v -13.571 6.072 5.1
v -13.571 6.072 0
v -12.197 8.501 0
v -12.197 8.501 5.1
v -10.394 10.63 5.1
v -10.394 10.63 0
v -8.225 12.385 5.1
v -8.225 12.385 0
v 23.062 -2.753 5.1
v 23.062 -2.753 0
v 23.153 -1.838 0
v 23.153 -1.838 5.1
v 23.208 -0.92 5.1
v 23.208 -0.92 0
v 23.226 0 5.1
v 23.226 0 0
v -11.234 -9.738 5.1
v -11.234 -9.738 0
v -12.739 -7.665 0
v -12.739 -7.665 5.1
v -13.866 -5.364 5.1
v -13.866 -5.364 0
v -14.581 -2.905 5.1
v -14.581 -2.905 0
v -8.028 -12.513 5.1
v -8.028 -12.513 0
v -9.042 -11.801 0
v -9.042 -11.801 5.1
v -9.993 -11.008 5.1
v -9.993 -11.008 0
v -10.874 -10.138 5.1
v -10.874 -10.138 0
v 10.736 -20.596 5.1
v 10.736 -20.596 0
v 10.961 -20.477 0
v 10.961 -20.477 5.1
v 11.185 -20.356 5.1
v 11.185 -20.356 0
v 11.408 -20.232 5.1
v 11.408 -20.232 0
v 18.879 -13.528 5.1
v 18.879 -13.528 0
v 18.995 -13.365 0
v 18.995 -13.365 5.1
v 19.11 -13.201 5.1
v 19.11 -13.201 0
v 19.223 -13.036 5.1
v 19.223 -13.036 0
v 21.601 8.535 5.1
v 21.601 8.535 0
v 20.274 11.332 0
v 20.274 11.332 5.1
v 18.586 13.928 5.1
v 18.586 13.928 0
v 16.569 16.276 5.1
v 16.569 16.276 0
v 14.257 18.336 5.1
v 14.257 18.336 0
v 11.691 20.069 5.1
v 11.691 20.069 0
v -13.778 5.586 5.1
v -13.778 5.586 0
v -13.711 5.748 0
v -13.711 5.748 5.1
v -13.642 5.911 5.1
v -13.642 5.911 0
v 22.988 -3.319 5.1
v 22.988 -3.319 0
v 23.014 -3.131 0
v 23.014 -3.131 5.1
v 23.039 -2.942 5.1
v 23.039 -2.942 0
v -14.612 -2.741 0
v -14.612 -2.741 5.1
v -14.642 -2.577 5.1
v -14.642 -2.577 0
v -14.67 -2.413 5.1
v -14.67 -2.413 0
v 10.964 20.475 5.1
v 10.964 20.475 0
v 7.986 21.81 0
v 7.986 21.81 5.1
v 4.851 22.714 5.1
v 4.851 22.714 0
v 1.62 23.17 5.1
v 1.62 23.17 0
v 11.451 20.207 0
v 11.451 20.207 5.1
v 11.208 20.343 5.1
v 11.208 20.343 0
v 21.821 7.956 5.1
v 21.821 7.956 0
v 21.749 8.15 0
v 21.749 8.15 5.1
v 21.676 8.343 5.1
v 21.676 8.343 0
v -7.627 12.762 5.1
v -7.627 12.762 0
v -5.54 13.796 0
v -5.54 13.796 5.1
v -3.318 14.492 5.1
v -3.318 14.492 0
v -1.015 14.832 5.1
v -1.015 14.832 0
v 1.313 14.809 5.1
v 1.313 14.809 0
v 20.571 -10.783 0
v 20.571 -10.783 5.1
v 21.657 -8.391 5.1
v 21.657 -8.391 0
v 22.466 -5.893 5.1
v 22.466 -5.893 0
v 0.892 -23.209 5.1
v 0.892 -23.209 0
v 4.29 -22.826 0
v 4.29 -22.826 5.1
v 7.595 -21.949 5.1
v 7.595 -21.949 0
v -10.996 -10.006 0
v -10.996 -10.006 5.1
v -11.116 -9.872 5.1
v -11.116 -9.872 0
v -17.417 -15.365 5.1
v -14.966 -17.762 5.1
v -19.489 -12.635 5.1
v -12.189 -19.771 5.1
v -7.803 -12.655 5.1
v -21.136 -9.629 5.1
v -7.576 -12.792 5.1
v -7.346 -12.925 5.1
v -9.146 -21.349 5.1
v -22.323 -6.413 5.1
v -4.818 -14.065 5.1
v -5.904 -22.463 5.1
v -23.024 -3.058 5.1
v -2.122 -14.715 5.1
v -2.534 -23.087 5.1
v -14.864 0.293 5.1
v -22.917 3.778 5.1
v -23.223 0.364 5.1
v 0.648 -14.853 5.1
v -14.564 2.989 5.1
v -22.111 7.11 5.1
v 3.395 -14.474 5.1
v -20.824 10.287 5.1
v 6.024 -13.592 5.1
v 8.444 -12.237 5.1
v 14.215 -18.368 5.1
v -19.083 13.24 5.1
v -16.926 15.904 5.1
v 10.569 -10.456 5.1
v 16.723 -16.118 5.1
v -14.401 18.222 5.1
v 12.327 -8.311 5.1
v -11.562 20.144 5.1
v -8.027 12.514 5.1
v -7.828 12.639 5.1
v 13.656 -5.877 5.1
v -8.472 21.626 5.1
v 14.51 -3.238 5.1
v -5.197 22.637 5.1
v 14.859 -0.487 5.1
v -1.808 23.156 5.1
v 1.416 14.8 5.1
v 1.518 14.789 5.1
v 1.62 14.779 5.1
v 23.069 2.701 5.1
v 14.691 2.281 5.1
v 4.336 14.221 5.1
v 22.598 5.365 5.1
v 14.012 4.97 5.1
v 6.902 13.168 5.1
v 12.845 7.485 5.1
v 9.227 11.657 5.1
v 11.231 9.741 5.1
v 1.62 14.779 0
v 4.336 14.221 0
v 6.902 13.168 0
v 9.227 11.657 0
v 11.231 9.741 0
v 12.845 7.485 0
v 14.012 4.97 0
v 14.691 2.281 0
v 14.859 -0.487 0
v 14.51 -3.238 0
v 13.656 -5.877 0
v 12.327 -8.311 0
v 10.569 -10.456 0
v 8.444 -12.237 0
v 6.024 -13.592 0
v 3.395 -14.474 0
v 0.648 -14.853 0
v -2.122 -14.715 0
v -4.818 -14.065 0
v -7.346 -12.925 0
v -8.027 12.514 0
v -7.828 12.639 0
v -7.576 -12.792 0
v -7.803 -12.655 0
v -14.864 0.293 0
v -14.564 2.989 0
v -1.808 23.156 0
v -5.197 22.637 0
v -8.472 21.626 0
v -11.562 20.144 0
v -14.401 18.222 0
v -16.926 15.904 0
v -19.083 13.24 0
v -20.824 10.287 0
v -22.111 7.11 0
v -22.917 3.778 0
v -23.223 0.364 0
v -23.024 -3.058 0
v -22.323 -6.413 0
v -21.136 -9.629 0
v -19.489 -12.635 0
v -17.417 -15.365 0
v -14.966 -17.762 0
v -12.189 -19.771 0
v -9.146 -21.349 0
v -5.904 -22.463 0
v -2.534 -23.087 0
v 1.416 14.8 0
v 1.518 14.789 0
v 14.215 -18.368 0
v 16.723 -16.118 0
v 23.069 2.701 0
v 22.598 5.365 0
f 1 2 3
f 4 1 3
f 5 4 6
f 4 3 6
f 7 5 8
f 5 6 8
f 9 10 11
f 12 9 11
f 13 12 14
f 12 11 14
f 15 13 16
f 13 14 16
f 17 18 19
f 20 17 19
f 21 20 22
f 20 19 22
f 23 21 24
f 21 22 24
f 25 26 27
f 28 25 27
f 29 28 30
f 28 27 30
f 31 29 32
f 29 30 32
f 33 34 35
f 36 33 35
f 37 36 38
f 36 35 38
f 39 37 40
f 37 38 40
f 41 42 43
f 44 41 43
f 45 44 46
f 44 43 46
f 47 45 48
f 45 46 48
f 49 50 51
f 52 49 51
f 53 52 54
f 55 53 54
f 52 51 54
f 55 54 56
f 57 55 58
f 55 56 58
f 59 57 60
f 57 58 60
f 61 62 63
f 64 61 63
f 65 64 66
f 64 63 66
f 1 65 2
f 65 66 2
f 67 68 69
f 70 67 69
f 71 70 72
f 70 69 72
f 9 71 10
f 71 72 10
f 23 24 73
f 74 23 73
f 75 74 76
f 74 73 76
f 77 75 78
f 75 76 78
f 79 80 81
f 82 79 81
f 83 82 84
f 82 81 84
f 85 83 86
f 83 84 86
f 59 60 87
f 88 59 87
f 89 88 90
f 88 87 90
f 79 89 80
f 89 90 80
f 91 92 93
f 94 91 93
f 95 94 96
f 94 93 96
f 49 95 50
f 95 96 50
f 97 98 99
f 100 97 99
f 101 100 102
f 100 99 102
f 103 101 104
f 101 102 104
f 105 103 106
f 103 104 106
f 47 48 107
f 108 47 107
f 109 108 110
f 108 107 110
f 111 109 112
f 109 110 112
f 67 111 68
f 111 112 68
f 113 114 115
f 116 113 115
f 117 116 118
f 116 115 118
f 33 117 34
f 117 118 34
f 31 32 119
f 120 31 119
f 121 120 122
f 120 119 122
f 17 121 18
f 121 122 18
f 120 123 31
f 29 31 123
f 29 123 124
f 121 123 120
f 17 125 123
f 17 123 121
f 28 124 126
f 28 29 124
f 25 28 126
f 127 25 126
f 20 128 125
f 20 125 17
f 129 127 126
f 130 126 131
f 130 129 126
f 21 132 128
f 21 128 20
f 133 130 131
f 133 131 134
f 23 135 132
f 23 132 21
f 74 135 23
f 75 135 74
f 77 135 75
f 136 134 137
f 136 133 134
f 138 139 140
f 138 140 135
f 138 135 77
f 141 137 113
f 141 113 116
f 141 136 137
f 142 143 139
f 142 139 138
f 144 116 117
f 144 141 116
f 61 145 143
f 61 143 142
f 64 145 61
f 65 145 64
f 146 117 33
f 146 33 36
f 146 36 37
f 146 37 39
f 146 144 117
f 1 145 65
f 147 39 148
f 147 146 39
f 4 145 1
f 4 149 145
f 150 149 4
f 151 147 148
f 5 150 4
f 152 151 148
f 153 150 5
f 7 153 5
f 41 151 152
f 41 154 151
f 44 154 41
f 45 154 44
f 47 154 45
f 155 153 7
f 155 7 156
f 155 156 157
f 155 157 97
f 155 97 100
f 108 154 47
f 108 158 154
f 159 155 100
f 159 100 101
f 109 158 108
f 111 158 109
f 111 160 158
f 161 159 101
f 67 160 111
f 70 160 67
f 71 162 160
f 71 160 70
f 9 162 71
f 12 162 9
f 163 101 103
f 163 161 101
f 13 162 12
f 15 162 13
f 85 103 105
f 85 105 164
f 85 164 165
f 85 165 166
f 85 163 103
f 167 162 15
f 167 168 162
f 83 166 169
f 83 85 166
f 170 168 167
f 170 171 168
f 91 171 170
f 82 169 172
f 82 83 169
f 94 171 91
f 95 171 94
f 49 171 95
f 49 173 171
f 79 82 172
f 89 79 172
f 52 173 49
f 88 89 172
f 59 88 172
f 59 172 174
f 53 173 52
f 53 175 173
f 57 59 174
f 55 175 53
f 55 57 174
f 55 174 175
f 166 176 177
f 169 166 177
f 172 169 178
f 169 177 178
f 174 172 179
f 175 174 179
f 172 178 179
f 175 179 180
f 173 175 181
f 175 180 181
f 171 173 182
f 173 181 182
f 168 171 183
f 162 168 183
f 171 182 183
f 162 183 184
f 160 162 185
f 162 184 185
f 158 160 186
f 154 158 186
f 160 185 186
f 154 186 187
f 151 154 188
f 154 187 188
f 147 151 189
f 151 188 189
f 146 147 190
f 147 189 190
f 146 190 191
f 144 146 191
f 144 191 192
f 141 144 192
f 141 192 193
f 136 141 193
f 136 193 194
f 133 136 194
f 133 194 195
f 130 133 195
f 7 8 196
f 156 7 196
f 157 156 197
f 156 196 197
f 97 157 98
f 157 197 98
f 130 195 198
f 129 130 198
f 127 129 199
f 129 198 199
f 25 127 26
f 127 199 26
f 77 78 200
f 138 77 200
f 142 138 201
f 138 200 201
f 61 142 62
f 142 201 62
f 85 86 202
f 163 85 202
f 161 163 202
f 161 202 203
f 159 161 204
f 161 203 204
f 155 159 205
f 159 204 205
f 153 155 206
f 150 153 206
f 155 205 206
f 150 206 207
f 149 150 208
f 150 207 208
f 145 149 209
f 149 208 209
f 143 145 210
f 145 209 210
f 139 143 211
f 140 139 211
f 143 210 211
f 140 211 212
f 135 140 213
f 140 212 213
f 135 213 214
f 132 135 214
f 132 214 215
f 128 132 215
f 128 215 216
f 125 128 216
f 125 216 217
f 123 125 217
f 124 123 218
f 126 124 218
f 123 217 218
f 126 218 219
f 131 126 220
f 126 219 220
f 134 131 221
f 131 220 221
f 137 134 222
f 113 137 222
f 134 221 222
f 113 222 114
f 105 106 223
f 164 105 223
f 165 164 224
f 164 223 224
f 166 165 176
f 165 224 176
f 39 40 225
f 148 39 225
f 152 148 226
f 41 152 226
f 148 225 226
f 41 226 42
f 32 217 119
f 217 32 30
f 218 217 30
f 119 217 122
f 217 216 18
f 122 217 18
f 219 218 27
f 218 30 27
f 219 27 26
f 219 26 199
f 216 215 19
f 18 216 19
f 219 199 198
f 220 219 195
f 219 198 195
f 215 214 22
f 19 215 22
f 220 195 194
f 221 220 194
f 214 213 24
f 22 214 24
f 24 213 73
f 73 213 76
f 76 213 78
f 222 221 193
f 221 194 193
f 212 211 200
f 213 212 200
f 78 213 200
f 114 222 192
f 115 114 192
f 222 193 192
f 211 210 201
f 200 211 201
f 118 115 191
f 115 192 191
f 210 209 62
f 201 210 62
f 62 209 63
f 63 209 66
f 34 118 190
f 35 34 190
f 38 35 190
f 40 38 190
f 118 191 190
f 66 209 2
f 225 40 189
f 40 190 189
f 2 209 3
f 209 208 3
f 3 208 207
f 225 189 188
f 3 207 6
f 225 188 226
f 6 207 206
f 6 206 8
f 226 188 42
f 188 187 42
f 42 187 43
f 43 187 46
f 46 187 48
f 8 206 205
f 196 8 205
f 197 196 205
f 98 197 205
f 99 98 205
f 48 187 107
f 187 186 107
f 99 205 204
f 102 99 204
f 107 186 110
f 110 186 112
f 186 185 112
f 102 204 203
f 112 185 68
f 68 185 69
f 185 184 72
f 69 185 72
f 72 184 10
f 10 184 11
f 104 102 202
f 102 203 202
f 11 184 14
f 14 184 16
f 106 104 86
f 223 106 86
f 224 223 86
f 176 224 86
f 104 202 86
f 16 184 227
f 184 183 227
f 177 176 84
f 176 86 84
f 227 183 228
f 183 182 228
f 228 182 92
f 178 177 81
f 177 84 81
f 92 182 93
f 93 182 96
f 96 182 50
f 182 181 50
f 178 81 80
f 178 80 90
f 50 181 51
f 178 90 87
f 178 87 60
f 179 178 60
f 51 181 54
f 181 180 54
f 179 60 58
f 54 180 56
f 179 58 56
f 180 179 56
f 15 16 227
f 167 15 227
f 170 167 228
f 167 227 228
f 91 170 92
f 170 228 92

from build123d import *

# Parameters (mm, degrees)
F1_DEPTH = 5.1


with BuildPart() as f1:
    # F0 (on Top) → F1 (new body)
    with BuildSketch(Plane.XY):
        with BuildLine():
            ThreePointArc((23.0623797864, -2.752888696), (23.1851344055, -1.378876421), (23.2261007831, 0))
            ThreePointArc((23.2261007831, 0), (22.8721340644, 4.039460475), (21.8210228424, 7.9557978667))
            ThreePointArc((21.8210228424, 7.9557978667), (21.7129320627, 8.2462317956), (21.600975855, 8.5351976954))
            ThreePointArc((21.600975855, 8.5351976954), (17.6168585154, 15.135985387), (11.6914938176, 20.0688995687))
            ThreePointArc((11.6914938176, 20.0688995687), (11.3296656288, 20.2753652082), (10.9641925592, 20.4753080346))
            ThreePointArc((10.9641925592, 20.4753080346), (6.4344525637, 22.3170243938), (1.6195142321, 23.1695690775))
            ThreePointArc((1.6195142321, 23.1695690775), (-23.2232414227, 0.3644384862), (0.891703377, -23.2089772001))
            ThreePointArc((0.891703377, -23.2089772001), (5.9586225424, -22.4487544194), (10.7355743028, -20.5960967655))
            ThreePointArc((10.7355743028, -20.5960967655), (11.0730407687, -20.4166482489), (11.4075086171, -20.231670834))
            ThreePointArc((11.4075086171, -20.231670834), (15.509940512, -17.2885367484), (18.8794446221, -13.5284266767))
            ThreePointArc((18.8794446221, -13.5284266767), (19.0526450726, -13.283390882), (19.2226654093, -13.0361379307))
            ThreePointArc((19.2226654093, -13.0361379307), (21.6572092153, -8.3914865543), (22.9877271358, -3.3190599146))
            ThreePointArc((22.9877271358, -3.3190599146), (23.0267936185, -3.0362037542), (23.0623797864, -2.752888696))
        make_face()
        with BuildLine():
            ThreePointArc((-7.6265143045, 12.7618767873), (-3.3183069466, 14.491999813), (1.3134897969, 14.8089150219))
            ThreePointArc((1.3134897969, 14.8089150219), (1.4665804544, 14.7945382268), (1.6195142321, 14.7785788635))
            ThreePointArc((1.6195142321, 14.7785788635), (11.0703798721, 9.9235028624), (14.8670514754, 0))
            ThreePointArc((14.8670514754, 0), (7.4772282889, -12.8499134895), (-7.3458637029, -12.9254596062))
            ThreePointArc((-7.3458637029, -12.9254596062), (-7.689867558, -12.7238027536), (-8.0283394714, -12.5129926438))
            ThreePointArc((-8.0283394714, -12.5129926438), (-9.5257186584, -11.4144602856), (-10.874459487, -10.1378178341))
            ThreePointArc((-10.874459487, -10.1378178341), (-11.0561755007, -9.9393260772), (-11.2342689854, -9.7375777243))
            ThreePointArc((-11.2342689854, -9.7375777243), (-13.3519365266, -6.5387315713), (-14.5805712978, -2.9045068776))
            ThreePointArc((-14.5805712978, -2.9045068776), (-14.6272984034, -2.6592030743), (-14.6698988149, -2.4131490494))
            ThreePointArc((-14.6698988149, -2.4131490494), (-14.7754620576, 1.6477076674), (-13.7779120757, 5.5855490693))
            ThreePointArc((-13.7779120757, 5.5855490693), (-13.6764347777, 5.8296098793), (-13.570634607, 6.0718280554))
            ThreePointArc((-13.570634607, 6.0718280554), (-11.3456382043, 9.6075862374), (-8.2248041845, 12.3847412448))
            ThreePointArc((-8.2248041845, 12.3847412448), (-7.9279021351, 12.57686715), (-7.6265143045, 12.7618767873))
        make_face(mode=Mode.SUBTRACT)
    extrude(amount=F1_DEPTH)


solid = f1.part
